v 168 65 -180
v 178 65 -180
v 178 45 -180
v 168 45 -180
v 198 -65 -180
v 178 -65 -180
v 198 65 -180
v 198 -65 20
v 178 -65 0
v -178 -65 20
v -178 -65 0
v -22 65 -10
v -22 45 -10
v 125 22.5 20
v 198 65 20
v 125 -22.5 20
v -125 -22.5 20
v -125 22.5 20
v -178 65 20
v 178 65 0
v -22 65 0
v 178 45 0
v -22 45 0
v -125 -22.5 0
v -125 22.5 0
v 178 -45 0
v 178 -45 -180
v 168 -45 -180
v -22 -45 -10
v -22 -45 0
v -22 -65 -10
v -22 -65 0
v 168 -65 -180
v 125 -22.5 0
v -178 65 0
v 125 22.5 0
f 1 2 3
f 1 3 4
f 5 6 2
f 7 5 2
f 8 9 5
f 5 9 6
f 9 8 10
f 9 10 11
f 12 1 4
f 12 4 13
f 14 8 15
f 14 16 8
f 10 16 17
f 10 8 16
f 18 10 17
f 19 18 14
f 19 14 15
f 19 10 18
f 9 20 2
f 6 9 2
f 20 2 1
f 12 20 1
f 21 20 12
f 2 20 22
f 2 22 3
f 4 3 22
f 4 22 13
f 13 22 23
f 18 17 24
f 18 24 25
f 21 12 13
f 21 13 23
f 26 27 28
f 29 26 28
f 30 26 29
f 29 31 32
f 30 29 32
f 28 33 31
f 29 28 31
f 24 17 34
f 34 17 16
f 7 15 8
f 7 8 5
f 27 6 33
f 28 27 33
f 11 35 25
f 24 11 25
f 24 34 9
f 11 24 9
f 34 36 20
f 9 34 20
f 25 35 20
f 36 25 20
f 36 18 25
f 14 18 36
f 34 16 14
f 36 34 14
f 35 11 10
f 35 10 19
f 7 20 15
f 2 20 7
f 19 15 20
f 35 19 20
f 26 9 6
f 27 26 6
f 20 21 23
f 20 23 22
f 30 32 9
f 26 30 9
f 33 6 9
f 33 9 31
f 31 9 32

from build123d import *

# Parameters (mm, degrees)
SKETCH_1_W          = 356
SKETCH_1_H          = 130
EXTRUDE_1_DEPTH     = 20
SKETCH_2_W          = 200
SKETCH_2_H          = 130
EXTRUDE_2_DEPTH     = 20
EXTRUDE_3_DEPTH     = 20
SKETCH_4_W          = 250
SKETCH_4_H          = 45
CUT_EXTRUDE_1_DEPTH = 289.840786594


with BuildPart() as part:
    # 草图1 → 凸台-拉伸1 (new body)
    with BuildSketch(Plane.XY):
        Rectangle(SKETCH_1_W, SKETCH_1_H)
    extrude(amount=EXTRUDE_1_DEPTH)

    # 草图2 → 凸台-拉伸2 (add)
    with BuildSketch(Plane(origin=(178, 0, 0), x_dir=(0, 0, -1), z_dir=(1, 0, 0))):
        with Locations((80, 0)):
            Rectangle(SKETCH_2_W, SKETCH_2_H)
    extrude(amount=EXTRUDE_2_DEPTH)

    # 草图4 → 切除-拉伸1 (cut, through all)
    with BuildSketch(Plane.XY.offset(20)):
        Rectangle(SKETCH_4_W, SKETCH_4_H)
    extrude(amount=-CUT_EXTRUDE_1_DEPTH, mode=Mode.SUBTRACT)


with BuildPart() as body_2:
    # 草图3 → 凸台-拉伸3 (new body)
    with BuildSketch(Plane.XZ.offset(65)):
        Polygon((178, -180), (168, -180), (-22, -10), (-22, 0), (178, 0), align=None)
    extrude(amount=-EXTRUDE_3_DEPTH)


with BuildPart() as body_3:
    # 镜向2: mirrored copy
    add(body_2.part.mirror(Plane.ZX))


solid = Compound([part.part, body_2.part, body_3.part])
